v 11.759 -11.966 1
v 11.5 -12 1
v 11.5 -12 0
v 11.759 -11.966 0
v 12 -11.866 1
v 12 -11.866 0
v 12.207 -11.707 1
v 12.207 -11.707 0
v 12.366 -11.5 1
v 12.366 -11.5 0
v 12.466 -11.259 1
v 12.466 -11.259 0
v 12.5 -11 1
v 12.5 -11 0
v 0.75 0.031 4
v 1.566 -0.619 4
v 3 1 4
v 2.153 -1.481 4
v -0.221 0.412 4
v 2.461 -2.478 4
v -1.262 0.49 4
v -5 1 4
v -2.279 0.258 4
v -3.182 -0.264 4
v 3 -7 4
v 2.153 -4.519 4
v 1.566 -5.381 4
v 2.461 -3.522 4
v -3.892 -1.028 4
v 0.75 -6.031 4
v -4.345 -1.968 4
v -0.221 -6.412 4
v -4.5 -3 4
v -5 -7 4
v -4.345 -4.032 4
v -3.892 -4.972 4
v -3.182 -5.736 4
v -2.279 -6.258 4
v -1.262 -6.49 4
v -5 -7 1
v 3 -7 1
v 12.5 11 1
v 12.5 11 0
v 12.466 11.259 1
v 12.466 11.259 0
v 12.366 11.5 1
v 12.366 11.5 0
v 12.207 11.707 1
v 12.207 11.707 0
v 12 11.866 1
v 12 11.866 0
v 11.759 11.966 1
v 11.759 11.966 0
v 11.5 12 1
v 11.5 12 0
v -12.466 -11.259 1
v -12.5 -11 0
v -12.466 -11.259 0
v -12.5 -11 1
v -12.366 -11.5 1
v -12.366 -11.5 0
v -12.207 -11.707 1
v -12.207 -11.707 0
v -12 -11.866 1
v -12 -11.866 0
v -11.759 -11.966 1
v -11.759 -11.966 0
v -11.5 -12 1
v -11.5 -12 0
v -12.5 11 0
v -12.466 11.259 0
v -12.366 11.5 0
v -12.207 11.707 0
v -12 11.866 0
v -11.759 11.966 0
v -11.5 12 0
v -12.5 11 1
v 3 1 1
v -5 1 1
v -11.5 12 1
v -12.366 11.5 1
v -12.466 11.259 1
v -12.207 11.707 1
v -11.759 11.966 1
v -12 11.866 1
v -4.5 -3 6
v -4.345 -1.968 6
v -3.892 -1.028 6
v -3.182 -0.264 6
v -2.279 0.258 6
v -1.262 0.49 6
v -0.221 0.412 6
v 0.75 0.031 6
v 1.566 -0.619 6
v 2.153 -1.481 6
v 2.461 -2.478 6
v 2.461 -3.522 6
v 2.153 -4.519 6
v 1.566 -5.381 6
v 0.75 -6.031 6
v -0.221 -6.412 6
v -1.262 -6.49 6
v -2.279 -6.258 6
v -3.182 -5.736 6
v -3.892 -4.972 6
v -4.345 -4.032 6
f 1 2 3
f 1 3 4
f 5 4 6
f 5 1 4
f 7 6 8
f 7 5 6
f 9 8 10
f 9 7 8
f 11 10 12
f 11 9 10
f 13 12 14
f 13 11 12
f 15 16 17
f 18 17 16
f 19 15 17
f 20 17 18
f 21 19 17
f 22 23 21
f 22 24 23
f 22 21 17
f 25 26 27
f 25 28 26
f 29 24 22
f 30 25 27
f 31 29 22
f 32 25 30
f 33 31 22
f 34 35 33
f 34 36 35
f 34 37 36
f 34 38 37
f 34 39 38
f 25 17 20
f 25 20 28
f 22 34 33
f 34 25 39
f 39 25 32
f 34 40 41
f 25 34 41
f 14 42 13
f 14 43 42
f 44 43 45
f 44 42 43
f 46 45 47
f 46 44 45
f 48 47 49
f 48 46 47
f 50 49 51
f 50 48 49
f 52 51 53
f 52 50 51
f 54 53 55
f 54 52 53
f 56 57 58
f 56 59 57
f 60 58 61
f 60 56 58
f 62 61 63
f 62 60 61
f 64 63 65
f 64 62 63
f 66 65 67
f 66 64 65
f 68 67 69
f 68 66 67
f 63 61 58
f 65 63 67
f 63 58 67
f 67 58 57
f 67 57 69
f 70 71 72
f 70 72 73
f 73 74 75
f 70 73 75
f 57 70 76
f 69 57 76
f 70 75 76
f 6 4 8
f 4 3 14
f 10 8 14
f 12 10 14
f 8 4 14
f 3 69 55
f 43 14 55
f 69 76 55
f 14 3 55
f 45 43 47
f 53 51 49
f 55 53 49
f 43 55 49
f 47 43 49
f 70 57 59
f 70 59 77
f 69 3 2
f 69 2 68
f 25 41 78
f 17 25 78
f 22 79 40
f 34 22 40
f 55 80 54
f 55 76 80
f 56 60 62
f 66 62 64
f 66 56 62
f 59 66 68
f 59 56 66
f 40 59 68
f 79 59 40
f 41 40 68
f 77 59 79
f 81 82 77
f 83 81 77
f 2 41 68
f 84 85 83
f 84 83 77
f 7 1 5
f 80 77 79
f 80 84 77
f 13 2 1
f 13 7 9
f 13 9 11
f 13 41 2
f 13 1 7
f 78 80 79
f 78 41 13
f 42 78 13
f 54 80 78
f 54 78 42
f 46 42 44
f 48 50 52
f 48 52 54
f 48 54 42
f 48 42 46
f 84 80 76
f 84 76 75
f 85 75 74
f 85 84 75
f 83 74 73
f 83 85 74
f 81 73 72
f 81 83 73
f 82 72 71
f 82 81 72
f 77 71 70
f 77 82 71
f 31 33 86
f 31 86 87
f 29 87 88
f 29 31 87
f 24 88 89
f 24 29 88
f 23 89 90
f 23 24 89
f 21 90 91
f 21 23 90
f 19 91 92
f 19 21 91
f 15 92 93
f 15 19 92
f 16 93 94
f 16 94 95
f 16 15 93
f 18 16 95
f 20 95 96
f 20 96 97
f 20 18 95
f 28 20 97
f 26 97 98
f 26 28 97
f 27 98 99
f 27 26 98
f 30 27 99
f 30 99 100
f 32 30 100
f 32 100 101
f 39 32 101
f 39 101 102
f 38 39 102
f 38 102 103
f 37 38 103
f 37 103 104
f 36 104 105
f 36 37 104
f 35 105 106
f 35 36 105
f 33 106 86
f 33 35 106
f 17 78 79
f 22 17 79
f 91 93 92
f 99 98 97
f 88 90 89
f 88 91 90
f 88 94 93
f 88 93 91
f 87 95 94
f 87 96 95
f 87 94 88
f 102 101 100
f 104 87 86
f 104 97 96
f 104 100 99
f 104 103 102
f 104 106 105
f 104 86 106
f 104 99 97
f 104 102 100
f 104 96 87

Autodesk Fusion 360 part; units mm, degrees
sketch "Sketch1" plane through (0, 0, 0) normal (0, 0, 1) x (1, 0, 0)
  line L0 (12.5, -12) -> (-12.5, -12)
  line L1 (-12.5, -12) -> (-12.5, 12)
  line L2 (-12.5, 12) -> (12.5, 12)
  line L3 (12.5, 12) -> (12.5, -12)
  line L4 (12.5, -12) -> (-12.5, 12) construction
  line L5 (-12.5, -12) -> (12.5, 12) construction
  dimension "d1" = 25
  dimension "d2" = 24
extrude "Extrude1" add sketch "Sketch1" along normal blind 1
sketch "Sketch2" plane through (0, 0, 1) normal (0, 0, 1) x (-1, 0, 0)
  line L0 (-12.5, -12) -> (12.5, -12)
  line L1 (12.5, -12) -> (12.5, 12)
  line L2 (12.5, 12) -> (-12.5, 12)
  line L3 (-12.5, 12) -> (-12.5, -12)
  line L4 (5, 7) -> (-3, 7)
  line L5 (-3, 7) -> (-3, -1)
  line L6 (-3, -1) -> (5, -1)
  line L7 (5, -1) -> (5, 7)
  dimension "d5" = 8
  dimension "d6" = 8
  dimension "d7" = 7.5
  dimension "d8" = 5
extrude "Extrude2" add sketch "Sketch2" along normal blind 3 contours L4 L5 L6 L7
sketch "Sketch3" plane through (0, 0, 4) normal (0, 0, 1) x (-1, 0, 0)
  line L0 (5, -1) -> (5, 7)
  line L1 (5, 7) -> (-3, 7)
  line L2 (-3, 7) -> (-3, -1)
  line L3 (-3, -1) -> (5, -1)
  line L4 (-3, 3) -> (5, 3)
  line L5 (1, -1) -> (1, 7)
  circle A0 centre (1, 3) radius 3.5
  dimension "d11" = 7
extrude "Extrude3" add sketch "Sketch3" along normal blind 2 contours L4 L5 A0 | L4 L5 A0 | L4 L5 A0 | L4 L5 A0
fillet "Fillet1" radius 1 4 edges at (-12.5, -12, 0.5) (12.5, 12, 0.5) (12.5, -12, 0.5) (-12.5, 12, 0.5)
